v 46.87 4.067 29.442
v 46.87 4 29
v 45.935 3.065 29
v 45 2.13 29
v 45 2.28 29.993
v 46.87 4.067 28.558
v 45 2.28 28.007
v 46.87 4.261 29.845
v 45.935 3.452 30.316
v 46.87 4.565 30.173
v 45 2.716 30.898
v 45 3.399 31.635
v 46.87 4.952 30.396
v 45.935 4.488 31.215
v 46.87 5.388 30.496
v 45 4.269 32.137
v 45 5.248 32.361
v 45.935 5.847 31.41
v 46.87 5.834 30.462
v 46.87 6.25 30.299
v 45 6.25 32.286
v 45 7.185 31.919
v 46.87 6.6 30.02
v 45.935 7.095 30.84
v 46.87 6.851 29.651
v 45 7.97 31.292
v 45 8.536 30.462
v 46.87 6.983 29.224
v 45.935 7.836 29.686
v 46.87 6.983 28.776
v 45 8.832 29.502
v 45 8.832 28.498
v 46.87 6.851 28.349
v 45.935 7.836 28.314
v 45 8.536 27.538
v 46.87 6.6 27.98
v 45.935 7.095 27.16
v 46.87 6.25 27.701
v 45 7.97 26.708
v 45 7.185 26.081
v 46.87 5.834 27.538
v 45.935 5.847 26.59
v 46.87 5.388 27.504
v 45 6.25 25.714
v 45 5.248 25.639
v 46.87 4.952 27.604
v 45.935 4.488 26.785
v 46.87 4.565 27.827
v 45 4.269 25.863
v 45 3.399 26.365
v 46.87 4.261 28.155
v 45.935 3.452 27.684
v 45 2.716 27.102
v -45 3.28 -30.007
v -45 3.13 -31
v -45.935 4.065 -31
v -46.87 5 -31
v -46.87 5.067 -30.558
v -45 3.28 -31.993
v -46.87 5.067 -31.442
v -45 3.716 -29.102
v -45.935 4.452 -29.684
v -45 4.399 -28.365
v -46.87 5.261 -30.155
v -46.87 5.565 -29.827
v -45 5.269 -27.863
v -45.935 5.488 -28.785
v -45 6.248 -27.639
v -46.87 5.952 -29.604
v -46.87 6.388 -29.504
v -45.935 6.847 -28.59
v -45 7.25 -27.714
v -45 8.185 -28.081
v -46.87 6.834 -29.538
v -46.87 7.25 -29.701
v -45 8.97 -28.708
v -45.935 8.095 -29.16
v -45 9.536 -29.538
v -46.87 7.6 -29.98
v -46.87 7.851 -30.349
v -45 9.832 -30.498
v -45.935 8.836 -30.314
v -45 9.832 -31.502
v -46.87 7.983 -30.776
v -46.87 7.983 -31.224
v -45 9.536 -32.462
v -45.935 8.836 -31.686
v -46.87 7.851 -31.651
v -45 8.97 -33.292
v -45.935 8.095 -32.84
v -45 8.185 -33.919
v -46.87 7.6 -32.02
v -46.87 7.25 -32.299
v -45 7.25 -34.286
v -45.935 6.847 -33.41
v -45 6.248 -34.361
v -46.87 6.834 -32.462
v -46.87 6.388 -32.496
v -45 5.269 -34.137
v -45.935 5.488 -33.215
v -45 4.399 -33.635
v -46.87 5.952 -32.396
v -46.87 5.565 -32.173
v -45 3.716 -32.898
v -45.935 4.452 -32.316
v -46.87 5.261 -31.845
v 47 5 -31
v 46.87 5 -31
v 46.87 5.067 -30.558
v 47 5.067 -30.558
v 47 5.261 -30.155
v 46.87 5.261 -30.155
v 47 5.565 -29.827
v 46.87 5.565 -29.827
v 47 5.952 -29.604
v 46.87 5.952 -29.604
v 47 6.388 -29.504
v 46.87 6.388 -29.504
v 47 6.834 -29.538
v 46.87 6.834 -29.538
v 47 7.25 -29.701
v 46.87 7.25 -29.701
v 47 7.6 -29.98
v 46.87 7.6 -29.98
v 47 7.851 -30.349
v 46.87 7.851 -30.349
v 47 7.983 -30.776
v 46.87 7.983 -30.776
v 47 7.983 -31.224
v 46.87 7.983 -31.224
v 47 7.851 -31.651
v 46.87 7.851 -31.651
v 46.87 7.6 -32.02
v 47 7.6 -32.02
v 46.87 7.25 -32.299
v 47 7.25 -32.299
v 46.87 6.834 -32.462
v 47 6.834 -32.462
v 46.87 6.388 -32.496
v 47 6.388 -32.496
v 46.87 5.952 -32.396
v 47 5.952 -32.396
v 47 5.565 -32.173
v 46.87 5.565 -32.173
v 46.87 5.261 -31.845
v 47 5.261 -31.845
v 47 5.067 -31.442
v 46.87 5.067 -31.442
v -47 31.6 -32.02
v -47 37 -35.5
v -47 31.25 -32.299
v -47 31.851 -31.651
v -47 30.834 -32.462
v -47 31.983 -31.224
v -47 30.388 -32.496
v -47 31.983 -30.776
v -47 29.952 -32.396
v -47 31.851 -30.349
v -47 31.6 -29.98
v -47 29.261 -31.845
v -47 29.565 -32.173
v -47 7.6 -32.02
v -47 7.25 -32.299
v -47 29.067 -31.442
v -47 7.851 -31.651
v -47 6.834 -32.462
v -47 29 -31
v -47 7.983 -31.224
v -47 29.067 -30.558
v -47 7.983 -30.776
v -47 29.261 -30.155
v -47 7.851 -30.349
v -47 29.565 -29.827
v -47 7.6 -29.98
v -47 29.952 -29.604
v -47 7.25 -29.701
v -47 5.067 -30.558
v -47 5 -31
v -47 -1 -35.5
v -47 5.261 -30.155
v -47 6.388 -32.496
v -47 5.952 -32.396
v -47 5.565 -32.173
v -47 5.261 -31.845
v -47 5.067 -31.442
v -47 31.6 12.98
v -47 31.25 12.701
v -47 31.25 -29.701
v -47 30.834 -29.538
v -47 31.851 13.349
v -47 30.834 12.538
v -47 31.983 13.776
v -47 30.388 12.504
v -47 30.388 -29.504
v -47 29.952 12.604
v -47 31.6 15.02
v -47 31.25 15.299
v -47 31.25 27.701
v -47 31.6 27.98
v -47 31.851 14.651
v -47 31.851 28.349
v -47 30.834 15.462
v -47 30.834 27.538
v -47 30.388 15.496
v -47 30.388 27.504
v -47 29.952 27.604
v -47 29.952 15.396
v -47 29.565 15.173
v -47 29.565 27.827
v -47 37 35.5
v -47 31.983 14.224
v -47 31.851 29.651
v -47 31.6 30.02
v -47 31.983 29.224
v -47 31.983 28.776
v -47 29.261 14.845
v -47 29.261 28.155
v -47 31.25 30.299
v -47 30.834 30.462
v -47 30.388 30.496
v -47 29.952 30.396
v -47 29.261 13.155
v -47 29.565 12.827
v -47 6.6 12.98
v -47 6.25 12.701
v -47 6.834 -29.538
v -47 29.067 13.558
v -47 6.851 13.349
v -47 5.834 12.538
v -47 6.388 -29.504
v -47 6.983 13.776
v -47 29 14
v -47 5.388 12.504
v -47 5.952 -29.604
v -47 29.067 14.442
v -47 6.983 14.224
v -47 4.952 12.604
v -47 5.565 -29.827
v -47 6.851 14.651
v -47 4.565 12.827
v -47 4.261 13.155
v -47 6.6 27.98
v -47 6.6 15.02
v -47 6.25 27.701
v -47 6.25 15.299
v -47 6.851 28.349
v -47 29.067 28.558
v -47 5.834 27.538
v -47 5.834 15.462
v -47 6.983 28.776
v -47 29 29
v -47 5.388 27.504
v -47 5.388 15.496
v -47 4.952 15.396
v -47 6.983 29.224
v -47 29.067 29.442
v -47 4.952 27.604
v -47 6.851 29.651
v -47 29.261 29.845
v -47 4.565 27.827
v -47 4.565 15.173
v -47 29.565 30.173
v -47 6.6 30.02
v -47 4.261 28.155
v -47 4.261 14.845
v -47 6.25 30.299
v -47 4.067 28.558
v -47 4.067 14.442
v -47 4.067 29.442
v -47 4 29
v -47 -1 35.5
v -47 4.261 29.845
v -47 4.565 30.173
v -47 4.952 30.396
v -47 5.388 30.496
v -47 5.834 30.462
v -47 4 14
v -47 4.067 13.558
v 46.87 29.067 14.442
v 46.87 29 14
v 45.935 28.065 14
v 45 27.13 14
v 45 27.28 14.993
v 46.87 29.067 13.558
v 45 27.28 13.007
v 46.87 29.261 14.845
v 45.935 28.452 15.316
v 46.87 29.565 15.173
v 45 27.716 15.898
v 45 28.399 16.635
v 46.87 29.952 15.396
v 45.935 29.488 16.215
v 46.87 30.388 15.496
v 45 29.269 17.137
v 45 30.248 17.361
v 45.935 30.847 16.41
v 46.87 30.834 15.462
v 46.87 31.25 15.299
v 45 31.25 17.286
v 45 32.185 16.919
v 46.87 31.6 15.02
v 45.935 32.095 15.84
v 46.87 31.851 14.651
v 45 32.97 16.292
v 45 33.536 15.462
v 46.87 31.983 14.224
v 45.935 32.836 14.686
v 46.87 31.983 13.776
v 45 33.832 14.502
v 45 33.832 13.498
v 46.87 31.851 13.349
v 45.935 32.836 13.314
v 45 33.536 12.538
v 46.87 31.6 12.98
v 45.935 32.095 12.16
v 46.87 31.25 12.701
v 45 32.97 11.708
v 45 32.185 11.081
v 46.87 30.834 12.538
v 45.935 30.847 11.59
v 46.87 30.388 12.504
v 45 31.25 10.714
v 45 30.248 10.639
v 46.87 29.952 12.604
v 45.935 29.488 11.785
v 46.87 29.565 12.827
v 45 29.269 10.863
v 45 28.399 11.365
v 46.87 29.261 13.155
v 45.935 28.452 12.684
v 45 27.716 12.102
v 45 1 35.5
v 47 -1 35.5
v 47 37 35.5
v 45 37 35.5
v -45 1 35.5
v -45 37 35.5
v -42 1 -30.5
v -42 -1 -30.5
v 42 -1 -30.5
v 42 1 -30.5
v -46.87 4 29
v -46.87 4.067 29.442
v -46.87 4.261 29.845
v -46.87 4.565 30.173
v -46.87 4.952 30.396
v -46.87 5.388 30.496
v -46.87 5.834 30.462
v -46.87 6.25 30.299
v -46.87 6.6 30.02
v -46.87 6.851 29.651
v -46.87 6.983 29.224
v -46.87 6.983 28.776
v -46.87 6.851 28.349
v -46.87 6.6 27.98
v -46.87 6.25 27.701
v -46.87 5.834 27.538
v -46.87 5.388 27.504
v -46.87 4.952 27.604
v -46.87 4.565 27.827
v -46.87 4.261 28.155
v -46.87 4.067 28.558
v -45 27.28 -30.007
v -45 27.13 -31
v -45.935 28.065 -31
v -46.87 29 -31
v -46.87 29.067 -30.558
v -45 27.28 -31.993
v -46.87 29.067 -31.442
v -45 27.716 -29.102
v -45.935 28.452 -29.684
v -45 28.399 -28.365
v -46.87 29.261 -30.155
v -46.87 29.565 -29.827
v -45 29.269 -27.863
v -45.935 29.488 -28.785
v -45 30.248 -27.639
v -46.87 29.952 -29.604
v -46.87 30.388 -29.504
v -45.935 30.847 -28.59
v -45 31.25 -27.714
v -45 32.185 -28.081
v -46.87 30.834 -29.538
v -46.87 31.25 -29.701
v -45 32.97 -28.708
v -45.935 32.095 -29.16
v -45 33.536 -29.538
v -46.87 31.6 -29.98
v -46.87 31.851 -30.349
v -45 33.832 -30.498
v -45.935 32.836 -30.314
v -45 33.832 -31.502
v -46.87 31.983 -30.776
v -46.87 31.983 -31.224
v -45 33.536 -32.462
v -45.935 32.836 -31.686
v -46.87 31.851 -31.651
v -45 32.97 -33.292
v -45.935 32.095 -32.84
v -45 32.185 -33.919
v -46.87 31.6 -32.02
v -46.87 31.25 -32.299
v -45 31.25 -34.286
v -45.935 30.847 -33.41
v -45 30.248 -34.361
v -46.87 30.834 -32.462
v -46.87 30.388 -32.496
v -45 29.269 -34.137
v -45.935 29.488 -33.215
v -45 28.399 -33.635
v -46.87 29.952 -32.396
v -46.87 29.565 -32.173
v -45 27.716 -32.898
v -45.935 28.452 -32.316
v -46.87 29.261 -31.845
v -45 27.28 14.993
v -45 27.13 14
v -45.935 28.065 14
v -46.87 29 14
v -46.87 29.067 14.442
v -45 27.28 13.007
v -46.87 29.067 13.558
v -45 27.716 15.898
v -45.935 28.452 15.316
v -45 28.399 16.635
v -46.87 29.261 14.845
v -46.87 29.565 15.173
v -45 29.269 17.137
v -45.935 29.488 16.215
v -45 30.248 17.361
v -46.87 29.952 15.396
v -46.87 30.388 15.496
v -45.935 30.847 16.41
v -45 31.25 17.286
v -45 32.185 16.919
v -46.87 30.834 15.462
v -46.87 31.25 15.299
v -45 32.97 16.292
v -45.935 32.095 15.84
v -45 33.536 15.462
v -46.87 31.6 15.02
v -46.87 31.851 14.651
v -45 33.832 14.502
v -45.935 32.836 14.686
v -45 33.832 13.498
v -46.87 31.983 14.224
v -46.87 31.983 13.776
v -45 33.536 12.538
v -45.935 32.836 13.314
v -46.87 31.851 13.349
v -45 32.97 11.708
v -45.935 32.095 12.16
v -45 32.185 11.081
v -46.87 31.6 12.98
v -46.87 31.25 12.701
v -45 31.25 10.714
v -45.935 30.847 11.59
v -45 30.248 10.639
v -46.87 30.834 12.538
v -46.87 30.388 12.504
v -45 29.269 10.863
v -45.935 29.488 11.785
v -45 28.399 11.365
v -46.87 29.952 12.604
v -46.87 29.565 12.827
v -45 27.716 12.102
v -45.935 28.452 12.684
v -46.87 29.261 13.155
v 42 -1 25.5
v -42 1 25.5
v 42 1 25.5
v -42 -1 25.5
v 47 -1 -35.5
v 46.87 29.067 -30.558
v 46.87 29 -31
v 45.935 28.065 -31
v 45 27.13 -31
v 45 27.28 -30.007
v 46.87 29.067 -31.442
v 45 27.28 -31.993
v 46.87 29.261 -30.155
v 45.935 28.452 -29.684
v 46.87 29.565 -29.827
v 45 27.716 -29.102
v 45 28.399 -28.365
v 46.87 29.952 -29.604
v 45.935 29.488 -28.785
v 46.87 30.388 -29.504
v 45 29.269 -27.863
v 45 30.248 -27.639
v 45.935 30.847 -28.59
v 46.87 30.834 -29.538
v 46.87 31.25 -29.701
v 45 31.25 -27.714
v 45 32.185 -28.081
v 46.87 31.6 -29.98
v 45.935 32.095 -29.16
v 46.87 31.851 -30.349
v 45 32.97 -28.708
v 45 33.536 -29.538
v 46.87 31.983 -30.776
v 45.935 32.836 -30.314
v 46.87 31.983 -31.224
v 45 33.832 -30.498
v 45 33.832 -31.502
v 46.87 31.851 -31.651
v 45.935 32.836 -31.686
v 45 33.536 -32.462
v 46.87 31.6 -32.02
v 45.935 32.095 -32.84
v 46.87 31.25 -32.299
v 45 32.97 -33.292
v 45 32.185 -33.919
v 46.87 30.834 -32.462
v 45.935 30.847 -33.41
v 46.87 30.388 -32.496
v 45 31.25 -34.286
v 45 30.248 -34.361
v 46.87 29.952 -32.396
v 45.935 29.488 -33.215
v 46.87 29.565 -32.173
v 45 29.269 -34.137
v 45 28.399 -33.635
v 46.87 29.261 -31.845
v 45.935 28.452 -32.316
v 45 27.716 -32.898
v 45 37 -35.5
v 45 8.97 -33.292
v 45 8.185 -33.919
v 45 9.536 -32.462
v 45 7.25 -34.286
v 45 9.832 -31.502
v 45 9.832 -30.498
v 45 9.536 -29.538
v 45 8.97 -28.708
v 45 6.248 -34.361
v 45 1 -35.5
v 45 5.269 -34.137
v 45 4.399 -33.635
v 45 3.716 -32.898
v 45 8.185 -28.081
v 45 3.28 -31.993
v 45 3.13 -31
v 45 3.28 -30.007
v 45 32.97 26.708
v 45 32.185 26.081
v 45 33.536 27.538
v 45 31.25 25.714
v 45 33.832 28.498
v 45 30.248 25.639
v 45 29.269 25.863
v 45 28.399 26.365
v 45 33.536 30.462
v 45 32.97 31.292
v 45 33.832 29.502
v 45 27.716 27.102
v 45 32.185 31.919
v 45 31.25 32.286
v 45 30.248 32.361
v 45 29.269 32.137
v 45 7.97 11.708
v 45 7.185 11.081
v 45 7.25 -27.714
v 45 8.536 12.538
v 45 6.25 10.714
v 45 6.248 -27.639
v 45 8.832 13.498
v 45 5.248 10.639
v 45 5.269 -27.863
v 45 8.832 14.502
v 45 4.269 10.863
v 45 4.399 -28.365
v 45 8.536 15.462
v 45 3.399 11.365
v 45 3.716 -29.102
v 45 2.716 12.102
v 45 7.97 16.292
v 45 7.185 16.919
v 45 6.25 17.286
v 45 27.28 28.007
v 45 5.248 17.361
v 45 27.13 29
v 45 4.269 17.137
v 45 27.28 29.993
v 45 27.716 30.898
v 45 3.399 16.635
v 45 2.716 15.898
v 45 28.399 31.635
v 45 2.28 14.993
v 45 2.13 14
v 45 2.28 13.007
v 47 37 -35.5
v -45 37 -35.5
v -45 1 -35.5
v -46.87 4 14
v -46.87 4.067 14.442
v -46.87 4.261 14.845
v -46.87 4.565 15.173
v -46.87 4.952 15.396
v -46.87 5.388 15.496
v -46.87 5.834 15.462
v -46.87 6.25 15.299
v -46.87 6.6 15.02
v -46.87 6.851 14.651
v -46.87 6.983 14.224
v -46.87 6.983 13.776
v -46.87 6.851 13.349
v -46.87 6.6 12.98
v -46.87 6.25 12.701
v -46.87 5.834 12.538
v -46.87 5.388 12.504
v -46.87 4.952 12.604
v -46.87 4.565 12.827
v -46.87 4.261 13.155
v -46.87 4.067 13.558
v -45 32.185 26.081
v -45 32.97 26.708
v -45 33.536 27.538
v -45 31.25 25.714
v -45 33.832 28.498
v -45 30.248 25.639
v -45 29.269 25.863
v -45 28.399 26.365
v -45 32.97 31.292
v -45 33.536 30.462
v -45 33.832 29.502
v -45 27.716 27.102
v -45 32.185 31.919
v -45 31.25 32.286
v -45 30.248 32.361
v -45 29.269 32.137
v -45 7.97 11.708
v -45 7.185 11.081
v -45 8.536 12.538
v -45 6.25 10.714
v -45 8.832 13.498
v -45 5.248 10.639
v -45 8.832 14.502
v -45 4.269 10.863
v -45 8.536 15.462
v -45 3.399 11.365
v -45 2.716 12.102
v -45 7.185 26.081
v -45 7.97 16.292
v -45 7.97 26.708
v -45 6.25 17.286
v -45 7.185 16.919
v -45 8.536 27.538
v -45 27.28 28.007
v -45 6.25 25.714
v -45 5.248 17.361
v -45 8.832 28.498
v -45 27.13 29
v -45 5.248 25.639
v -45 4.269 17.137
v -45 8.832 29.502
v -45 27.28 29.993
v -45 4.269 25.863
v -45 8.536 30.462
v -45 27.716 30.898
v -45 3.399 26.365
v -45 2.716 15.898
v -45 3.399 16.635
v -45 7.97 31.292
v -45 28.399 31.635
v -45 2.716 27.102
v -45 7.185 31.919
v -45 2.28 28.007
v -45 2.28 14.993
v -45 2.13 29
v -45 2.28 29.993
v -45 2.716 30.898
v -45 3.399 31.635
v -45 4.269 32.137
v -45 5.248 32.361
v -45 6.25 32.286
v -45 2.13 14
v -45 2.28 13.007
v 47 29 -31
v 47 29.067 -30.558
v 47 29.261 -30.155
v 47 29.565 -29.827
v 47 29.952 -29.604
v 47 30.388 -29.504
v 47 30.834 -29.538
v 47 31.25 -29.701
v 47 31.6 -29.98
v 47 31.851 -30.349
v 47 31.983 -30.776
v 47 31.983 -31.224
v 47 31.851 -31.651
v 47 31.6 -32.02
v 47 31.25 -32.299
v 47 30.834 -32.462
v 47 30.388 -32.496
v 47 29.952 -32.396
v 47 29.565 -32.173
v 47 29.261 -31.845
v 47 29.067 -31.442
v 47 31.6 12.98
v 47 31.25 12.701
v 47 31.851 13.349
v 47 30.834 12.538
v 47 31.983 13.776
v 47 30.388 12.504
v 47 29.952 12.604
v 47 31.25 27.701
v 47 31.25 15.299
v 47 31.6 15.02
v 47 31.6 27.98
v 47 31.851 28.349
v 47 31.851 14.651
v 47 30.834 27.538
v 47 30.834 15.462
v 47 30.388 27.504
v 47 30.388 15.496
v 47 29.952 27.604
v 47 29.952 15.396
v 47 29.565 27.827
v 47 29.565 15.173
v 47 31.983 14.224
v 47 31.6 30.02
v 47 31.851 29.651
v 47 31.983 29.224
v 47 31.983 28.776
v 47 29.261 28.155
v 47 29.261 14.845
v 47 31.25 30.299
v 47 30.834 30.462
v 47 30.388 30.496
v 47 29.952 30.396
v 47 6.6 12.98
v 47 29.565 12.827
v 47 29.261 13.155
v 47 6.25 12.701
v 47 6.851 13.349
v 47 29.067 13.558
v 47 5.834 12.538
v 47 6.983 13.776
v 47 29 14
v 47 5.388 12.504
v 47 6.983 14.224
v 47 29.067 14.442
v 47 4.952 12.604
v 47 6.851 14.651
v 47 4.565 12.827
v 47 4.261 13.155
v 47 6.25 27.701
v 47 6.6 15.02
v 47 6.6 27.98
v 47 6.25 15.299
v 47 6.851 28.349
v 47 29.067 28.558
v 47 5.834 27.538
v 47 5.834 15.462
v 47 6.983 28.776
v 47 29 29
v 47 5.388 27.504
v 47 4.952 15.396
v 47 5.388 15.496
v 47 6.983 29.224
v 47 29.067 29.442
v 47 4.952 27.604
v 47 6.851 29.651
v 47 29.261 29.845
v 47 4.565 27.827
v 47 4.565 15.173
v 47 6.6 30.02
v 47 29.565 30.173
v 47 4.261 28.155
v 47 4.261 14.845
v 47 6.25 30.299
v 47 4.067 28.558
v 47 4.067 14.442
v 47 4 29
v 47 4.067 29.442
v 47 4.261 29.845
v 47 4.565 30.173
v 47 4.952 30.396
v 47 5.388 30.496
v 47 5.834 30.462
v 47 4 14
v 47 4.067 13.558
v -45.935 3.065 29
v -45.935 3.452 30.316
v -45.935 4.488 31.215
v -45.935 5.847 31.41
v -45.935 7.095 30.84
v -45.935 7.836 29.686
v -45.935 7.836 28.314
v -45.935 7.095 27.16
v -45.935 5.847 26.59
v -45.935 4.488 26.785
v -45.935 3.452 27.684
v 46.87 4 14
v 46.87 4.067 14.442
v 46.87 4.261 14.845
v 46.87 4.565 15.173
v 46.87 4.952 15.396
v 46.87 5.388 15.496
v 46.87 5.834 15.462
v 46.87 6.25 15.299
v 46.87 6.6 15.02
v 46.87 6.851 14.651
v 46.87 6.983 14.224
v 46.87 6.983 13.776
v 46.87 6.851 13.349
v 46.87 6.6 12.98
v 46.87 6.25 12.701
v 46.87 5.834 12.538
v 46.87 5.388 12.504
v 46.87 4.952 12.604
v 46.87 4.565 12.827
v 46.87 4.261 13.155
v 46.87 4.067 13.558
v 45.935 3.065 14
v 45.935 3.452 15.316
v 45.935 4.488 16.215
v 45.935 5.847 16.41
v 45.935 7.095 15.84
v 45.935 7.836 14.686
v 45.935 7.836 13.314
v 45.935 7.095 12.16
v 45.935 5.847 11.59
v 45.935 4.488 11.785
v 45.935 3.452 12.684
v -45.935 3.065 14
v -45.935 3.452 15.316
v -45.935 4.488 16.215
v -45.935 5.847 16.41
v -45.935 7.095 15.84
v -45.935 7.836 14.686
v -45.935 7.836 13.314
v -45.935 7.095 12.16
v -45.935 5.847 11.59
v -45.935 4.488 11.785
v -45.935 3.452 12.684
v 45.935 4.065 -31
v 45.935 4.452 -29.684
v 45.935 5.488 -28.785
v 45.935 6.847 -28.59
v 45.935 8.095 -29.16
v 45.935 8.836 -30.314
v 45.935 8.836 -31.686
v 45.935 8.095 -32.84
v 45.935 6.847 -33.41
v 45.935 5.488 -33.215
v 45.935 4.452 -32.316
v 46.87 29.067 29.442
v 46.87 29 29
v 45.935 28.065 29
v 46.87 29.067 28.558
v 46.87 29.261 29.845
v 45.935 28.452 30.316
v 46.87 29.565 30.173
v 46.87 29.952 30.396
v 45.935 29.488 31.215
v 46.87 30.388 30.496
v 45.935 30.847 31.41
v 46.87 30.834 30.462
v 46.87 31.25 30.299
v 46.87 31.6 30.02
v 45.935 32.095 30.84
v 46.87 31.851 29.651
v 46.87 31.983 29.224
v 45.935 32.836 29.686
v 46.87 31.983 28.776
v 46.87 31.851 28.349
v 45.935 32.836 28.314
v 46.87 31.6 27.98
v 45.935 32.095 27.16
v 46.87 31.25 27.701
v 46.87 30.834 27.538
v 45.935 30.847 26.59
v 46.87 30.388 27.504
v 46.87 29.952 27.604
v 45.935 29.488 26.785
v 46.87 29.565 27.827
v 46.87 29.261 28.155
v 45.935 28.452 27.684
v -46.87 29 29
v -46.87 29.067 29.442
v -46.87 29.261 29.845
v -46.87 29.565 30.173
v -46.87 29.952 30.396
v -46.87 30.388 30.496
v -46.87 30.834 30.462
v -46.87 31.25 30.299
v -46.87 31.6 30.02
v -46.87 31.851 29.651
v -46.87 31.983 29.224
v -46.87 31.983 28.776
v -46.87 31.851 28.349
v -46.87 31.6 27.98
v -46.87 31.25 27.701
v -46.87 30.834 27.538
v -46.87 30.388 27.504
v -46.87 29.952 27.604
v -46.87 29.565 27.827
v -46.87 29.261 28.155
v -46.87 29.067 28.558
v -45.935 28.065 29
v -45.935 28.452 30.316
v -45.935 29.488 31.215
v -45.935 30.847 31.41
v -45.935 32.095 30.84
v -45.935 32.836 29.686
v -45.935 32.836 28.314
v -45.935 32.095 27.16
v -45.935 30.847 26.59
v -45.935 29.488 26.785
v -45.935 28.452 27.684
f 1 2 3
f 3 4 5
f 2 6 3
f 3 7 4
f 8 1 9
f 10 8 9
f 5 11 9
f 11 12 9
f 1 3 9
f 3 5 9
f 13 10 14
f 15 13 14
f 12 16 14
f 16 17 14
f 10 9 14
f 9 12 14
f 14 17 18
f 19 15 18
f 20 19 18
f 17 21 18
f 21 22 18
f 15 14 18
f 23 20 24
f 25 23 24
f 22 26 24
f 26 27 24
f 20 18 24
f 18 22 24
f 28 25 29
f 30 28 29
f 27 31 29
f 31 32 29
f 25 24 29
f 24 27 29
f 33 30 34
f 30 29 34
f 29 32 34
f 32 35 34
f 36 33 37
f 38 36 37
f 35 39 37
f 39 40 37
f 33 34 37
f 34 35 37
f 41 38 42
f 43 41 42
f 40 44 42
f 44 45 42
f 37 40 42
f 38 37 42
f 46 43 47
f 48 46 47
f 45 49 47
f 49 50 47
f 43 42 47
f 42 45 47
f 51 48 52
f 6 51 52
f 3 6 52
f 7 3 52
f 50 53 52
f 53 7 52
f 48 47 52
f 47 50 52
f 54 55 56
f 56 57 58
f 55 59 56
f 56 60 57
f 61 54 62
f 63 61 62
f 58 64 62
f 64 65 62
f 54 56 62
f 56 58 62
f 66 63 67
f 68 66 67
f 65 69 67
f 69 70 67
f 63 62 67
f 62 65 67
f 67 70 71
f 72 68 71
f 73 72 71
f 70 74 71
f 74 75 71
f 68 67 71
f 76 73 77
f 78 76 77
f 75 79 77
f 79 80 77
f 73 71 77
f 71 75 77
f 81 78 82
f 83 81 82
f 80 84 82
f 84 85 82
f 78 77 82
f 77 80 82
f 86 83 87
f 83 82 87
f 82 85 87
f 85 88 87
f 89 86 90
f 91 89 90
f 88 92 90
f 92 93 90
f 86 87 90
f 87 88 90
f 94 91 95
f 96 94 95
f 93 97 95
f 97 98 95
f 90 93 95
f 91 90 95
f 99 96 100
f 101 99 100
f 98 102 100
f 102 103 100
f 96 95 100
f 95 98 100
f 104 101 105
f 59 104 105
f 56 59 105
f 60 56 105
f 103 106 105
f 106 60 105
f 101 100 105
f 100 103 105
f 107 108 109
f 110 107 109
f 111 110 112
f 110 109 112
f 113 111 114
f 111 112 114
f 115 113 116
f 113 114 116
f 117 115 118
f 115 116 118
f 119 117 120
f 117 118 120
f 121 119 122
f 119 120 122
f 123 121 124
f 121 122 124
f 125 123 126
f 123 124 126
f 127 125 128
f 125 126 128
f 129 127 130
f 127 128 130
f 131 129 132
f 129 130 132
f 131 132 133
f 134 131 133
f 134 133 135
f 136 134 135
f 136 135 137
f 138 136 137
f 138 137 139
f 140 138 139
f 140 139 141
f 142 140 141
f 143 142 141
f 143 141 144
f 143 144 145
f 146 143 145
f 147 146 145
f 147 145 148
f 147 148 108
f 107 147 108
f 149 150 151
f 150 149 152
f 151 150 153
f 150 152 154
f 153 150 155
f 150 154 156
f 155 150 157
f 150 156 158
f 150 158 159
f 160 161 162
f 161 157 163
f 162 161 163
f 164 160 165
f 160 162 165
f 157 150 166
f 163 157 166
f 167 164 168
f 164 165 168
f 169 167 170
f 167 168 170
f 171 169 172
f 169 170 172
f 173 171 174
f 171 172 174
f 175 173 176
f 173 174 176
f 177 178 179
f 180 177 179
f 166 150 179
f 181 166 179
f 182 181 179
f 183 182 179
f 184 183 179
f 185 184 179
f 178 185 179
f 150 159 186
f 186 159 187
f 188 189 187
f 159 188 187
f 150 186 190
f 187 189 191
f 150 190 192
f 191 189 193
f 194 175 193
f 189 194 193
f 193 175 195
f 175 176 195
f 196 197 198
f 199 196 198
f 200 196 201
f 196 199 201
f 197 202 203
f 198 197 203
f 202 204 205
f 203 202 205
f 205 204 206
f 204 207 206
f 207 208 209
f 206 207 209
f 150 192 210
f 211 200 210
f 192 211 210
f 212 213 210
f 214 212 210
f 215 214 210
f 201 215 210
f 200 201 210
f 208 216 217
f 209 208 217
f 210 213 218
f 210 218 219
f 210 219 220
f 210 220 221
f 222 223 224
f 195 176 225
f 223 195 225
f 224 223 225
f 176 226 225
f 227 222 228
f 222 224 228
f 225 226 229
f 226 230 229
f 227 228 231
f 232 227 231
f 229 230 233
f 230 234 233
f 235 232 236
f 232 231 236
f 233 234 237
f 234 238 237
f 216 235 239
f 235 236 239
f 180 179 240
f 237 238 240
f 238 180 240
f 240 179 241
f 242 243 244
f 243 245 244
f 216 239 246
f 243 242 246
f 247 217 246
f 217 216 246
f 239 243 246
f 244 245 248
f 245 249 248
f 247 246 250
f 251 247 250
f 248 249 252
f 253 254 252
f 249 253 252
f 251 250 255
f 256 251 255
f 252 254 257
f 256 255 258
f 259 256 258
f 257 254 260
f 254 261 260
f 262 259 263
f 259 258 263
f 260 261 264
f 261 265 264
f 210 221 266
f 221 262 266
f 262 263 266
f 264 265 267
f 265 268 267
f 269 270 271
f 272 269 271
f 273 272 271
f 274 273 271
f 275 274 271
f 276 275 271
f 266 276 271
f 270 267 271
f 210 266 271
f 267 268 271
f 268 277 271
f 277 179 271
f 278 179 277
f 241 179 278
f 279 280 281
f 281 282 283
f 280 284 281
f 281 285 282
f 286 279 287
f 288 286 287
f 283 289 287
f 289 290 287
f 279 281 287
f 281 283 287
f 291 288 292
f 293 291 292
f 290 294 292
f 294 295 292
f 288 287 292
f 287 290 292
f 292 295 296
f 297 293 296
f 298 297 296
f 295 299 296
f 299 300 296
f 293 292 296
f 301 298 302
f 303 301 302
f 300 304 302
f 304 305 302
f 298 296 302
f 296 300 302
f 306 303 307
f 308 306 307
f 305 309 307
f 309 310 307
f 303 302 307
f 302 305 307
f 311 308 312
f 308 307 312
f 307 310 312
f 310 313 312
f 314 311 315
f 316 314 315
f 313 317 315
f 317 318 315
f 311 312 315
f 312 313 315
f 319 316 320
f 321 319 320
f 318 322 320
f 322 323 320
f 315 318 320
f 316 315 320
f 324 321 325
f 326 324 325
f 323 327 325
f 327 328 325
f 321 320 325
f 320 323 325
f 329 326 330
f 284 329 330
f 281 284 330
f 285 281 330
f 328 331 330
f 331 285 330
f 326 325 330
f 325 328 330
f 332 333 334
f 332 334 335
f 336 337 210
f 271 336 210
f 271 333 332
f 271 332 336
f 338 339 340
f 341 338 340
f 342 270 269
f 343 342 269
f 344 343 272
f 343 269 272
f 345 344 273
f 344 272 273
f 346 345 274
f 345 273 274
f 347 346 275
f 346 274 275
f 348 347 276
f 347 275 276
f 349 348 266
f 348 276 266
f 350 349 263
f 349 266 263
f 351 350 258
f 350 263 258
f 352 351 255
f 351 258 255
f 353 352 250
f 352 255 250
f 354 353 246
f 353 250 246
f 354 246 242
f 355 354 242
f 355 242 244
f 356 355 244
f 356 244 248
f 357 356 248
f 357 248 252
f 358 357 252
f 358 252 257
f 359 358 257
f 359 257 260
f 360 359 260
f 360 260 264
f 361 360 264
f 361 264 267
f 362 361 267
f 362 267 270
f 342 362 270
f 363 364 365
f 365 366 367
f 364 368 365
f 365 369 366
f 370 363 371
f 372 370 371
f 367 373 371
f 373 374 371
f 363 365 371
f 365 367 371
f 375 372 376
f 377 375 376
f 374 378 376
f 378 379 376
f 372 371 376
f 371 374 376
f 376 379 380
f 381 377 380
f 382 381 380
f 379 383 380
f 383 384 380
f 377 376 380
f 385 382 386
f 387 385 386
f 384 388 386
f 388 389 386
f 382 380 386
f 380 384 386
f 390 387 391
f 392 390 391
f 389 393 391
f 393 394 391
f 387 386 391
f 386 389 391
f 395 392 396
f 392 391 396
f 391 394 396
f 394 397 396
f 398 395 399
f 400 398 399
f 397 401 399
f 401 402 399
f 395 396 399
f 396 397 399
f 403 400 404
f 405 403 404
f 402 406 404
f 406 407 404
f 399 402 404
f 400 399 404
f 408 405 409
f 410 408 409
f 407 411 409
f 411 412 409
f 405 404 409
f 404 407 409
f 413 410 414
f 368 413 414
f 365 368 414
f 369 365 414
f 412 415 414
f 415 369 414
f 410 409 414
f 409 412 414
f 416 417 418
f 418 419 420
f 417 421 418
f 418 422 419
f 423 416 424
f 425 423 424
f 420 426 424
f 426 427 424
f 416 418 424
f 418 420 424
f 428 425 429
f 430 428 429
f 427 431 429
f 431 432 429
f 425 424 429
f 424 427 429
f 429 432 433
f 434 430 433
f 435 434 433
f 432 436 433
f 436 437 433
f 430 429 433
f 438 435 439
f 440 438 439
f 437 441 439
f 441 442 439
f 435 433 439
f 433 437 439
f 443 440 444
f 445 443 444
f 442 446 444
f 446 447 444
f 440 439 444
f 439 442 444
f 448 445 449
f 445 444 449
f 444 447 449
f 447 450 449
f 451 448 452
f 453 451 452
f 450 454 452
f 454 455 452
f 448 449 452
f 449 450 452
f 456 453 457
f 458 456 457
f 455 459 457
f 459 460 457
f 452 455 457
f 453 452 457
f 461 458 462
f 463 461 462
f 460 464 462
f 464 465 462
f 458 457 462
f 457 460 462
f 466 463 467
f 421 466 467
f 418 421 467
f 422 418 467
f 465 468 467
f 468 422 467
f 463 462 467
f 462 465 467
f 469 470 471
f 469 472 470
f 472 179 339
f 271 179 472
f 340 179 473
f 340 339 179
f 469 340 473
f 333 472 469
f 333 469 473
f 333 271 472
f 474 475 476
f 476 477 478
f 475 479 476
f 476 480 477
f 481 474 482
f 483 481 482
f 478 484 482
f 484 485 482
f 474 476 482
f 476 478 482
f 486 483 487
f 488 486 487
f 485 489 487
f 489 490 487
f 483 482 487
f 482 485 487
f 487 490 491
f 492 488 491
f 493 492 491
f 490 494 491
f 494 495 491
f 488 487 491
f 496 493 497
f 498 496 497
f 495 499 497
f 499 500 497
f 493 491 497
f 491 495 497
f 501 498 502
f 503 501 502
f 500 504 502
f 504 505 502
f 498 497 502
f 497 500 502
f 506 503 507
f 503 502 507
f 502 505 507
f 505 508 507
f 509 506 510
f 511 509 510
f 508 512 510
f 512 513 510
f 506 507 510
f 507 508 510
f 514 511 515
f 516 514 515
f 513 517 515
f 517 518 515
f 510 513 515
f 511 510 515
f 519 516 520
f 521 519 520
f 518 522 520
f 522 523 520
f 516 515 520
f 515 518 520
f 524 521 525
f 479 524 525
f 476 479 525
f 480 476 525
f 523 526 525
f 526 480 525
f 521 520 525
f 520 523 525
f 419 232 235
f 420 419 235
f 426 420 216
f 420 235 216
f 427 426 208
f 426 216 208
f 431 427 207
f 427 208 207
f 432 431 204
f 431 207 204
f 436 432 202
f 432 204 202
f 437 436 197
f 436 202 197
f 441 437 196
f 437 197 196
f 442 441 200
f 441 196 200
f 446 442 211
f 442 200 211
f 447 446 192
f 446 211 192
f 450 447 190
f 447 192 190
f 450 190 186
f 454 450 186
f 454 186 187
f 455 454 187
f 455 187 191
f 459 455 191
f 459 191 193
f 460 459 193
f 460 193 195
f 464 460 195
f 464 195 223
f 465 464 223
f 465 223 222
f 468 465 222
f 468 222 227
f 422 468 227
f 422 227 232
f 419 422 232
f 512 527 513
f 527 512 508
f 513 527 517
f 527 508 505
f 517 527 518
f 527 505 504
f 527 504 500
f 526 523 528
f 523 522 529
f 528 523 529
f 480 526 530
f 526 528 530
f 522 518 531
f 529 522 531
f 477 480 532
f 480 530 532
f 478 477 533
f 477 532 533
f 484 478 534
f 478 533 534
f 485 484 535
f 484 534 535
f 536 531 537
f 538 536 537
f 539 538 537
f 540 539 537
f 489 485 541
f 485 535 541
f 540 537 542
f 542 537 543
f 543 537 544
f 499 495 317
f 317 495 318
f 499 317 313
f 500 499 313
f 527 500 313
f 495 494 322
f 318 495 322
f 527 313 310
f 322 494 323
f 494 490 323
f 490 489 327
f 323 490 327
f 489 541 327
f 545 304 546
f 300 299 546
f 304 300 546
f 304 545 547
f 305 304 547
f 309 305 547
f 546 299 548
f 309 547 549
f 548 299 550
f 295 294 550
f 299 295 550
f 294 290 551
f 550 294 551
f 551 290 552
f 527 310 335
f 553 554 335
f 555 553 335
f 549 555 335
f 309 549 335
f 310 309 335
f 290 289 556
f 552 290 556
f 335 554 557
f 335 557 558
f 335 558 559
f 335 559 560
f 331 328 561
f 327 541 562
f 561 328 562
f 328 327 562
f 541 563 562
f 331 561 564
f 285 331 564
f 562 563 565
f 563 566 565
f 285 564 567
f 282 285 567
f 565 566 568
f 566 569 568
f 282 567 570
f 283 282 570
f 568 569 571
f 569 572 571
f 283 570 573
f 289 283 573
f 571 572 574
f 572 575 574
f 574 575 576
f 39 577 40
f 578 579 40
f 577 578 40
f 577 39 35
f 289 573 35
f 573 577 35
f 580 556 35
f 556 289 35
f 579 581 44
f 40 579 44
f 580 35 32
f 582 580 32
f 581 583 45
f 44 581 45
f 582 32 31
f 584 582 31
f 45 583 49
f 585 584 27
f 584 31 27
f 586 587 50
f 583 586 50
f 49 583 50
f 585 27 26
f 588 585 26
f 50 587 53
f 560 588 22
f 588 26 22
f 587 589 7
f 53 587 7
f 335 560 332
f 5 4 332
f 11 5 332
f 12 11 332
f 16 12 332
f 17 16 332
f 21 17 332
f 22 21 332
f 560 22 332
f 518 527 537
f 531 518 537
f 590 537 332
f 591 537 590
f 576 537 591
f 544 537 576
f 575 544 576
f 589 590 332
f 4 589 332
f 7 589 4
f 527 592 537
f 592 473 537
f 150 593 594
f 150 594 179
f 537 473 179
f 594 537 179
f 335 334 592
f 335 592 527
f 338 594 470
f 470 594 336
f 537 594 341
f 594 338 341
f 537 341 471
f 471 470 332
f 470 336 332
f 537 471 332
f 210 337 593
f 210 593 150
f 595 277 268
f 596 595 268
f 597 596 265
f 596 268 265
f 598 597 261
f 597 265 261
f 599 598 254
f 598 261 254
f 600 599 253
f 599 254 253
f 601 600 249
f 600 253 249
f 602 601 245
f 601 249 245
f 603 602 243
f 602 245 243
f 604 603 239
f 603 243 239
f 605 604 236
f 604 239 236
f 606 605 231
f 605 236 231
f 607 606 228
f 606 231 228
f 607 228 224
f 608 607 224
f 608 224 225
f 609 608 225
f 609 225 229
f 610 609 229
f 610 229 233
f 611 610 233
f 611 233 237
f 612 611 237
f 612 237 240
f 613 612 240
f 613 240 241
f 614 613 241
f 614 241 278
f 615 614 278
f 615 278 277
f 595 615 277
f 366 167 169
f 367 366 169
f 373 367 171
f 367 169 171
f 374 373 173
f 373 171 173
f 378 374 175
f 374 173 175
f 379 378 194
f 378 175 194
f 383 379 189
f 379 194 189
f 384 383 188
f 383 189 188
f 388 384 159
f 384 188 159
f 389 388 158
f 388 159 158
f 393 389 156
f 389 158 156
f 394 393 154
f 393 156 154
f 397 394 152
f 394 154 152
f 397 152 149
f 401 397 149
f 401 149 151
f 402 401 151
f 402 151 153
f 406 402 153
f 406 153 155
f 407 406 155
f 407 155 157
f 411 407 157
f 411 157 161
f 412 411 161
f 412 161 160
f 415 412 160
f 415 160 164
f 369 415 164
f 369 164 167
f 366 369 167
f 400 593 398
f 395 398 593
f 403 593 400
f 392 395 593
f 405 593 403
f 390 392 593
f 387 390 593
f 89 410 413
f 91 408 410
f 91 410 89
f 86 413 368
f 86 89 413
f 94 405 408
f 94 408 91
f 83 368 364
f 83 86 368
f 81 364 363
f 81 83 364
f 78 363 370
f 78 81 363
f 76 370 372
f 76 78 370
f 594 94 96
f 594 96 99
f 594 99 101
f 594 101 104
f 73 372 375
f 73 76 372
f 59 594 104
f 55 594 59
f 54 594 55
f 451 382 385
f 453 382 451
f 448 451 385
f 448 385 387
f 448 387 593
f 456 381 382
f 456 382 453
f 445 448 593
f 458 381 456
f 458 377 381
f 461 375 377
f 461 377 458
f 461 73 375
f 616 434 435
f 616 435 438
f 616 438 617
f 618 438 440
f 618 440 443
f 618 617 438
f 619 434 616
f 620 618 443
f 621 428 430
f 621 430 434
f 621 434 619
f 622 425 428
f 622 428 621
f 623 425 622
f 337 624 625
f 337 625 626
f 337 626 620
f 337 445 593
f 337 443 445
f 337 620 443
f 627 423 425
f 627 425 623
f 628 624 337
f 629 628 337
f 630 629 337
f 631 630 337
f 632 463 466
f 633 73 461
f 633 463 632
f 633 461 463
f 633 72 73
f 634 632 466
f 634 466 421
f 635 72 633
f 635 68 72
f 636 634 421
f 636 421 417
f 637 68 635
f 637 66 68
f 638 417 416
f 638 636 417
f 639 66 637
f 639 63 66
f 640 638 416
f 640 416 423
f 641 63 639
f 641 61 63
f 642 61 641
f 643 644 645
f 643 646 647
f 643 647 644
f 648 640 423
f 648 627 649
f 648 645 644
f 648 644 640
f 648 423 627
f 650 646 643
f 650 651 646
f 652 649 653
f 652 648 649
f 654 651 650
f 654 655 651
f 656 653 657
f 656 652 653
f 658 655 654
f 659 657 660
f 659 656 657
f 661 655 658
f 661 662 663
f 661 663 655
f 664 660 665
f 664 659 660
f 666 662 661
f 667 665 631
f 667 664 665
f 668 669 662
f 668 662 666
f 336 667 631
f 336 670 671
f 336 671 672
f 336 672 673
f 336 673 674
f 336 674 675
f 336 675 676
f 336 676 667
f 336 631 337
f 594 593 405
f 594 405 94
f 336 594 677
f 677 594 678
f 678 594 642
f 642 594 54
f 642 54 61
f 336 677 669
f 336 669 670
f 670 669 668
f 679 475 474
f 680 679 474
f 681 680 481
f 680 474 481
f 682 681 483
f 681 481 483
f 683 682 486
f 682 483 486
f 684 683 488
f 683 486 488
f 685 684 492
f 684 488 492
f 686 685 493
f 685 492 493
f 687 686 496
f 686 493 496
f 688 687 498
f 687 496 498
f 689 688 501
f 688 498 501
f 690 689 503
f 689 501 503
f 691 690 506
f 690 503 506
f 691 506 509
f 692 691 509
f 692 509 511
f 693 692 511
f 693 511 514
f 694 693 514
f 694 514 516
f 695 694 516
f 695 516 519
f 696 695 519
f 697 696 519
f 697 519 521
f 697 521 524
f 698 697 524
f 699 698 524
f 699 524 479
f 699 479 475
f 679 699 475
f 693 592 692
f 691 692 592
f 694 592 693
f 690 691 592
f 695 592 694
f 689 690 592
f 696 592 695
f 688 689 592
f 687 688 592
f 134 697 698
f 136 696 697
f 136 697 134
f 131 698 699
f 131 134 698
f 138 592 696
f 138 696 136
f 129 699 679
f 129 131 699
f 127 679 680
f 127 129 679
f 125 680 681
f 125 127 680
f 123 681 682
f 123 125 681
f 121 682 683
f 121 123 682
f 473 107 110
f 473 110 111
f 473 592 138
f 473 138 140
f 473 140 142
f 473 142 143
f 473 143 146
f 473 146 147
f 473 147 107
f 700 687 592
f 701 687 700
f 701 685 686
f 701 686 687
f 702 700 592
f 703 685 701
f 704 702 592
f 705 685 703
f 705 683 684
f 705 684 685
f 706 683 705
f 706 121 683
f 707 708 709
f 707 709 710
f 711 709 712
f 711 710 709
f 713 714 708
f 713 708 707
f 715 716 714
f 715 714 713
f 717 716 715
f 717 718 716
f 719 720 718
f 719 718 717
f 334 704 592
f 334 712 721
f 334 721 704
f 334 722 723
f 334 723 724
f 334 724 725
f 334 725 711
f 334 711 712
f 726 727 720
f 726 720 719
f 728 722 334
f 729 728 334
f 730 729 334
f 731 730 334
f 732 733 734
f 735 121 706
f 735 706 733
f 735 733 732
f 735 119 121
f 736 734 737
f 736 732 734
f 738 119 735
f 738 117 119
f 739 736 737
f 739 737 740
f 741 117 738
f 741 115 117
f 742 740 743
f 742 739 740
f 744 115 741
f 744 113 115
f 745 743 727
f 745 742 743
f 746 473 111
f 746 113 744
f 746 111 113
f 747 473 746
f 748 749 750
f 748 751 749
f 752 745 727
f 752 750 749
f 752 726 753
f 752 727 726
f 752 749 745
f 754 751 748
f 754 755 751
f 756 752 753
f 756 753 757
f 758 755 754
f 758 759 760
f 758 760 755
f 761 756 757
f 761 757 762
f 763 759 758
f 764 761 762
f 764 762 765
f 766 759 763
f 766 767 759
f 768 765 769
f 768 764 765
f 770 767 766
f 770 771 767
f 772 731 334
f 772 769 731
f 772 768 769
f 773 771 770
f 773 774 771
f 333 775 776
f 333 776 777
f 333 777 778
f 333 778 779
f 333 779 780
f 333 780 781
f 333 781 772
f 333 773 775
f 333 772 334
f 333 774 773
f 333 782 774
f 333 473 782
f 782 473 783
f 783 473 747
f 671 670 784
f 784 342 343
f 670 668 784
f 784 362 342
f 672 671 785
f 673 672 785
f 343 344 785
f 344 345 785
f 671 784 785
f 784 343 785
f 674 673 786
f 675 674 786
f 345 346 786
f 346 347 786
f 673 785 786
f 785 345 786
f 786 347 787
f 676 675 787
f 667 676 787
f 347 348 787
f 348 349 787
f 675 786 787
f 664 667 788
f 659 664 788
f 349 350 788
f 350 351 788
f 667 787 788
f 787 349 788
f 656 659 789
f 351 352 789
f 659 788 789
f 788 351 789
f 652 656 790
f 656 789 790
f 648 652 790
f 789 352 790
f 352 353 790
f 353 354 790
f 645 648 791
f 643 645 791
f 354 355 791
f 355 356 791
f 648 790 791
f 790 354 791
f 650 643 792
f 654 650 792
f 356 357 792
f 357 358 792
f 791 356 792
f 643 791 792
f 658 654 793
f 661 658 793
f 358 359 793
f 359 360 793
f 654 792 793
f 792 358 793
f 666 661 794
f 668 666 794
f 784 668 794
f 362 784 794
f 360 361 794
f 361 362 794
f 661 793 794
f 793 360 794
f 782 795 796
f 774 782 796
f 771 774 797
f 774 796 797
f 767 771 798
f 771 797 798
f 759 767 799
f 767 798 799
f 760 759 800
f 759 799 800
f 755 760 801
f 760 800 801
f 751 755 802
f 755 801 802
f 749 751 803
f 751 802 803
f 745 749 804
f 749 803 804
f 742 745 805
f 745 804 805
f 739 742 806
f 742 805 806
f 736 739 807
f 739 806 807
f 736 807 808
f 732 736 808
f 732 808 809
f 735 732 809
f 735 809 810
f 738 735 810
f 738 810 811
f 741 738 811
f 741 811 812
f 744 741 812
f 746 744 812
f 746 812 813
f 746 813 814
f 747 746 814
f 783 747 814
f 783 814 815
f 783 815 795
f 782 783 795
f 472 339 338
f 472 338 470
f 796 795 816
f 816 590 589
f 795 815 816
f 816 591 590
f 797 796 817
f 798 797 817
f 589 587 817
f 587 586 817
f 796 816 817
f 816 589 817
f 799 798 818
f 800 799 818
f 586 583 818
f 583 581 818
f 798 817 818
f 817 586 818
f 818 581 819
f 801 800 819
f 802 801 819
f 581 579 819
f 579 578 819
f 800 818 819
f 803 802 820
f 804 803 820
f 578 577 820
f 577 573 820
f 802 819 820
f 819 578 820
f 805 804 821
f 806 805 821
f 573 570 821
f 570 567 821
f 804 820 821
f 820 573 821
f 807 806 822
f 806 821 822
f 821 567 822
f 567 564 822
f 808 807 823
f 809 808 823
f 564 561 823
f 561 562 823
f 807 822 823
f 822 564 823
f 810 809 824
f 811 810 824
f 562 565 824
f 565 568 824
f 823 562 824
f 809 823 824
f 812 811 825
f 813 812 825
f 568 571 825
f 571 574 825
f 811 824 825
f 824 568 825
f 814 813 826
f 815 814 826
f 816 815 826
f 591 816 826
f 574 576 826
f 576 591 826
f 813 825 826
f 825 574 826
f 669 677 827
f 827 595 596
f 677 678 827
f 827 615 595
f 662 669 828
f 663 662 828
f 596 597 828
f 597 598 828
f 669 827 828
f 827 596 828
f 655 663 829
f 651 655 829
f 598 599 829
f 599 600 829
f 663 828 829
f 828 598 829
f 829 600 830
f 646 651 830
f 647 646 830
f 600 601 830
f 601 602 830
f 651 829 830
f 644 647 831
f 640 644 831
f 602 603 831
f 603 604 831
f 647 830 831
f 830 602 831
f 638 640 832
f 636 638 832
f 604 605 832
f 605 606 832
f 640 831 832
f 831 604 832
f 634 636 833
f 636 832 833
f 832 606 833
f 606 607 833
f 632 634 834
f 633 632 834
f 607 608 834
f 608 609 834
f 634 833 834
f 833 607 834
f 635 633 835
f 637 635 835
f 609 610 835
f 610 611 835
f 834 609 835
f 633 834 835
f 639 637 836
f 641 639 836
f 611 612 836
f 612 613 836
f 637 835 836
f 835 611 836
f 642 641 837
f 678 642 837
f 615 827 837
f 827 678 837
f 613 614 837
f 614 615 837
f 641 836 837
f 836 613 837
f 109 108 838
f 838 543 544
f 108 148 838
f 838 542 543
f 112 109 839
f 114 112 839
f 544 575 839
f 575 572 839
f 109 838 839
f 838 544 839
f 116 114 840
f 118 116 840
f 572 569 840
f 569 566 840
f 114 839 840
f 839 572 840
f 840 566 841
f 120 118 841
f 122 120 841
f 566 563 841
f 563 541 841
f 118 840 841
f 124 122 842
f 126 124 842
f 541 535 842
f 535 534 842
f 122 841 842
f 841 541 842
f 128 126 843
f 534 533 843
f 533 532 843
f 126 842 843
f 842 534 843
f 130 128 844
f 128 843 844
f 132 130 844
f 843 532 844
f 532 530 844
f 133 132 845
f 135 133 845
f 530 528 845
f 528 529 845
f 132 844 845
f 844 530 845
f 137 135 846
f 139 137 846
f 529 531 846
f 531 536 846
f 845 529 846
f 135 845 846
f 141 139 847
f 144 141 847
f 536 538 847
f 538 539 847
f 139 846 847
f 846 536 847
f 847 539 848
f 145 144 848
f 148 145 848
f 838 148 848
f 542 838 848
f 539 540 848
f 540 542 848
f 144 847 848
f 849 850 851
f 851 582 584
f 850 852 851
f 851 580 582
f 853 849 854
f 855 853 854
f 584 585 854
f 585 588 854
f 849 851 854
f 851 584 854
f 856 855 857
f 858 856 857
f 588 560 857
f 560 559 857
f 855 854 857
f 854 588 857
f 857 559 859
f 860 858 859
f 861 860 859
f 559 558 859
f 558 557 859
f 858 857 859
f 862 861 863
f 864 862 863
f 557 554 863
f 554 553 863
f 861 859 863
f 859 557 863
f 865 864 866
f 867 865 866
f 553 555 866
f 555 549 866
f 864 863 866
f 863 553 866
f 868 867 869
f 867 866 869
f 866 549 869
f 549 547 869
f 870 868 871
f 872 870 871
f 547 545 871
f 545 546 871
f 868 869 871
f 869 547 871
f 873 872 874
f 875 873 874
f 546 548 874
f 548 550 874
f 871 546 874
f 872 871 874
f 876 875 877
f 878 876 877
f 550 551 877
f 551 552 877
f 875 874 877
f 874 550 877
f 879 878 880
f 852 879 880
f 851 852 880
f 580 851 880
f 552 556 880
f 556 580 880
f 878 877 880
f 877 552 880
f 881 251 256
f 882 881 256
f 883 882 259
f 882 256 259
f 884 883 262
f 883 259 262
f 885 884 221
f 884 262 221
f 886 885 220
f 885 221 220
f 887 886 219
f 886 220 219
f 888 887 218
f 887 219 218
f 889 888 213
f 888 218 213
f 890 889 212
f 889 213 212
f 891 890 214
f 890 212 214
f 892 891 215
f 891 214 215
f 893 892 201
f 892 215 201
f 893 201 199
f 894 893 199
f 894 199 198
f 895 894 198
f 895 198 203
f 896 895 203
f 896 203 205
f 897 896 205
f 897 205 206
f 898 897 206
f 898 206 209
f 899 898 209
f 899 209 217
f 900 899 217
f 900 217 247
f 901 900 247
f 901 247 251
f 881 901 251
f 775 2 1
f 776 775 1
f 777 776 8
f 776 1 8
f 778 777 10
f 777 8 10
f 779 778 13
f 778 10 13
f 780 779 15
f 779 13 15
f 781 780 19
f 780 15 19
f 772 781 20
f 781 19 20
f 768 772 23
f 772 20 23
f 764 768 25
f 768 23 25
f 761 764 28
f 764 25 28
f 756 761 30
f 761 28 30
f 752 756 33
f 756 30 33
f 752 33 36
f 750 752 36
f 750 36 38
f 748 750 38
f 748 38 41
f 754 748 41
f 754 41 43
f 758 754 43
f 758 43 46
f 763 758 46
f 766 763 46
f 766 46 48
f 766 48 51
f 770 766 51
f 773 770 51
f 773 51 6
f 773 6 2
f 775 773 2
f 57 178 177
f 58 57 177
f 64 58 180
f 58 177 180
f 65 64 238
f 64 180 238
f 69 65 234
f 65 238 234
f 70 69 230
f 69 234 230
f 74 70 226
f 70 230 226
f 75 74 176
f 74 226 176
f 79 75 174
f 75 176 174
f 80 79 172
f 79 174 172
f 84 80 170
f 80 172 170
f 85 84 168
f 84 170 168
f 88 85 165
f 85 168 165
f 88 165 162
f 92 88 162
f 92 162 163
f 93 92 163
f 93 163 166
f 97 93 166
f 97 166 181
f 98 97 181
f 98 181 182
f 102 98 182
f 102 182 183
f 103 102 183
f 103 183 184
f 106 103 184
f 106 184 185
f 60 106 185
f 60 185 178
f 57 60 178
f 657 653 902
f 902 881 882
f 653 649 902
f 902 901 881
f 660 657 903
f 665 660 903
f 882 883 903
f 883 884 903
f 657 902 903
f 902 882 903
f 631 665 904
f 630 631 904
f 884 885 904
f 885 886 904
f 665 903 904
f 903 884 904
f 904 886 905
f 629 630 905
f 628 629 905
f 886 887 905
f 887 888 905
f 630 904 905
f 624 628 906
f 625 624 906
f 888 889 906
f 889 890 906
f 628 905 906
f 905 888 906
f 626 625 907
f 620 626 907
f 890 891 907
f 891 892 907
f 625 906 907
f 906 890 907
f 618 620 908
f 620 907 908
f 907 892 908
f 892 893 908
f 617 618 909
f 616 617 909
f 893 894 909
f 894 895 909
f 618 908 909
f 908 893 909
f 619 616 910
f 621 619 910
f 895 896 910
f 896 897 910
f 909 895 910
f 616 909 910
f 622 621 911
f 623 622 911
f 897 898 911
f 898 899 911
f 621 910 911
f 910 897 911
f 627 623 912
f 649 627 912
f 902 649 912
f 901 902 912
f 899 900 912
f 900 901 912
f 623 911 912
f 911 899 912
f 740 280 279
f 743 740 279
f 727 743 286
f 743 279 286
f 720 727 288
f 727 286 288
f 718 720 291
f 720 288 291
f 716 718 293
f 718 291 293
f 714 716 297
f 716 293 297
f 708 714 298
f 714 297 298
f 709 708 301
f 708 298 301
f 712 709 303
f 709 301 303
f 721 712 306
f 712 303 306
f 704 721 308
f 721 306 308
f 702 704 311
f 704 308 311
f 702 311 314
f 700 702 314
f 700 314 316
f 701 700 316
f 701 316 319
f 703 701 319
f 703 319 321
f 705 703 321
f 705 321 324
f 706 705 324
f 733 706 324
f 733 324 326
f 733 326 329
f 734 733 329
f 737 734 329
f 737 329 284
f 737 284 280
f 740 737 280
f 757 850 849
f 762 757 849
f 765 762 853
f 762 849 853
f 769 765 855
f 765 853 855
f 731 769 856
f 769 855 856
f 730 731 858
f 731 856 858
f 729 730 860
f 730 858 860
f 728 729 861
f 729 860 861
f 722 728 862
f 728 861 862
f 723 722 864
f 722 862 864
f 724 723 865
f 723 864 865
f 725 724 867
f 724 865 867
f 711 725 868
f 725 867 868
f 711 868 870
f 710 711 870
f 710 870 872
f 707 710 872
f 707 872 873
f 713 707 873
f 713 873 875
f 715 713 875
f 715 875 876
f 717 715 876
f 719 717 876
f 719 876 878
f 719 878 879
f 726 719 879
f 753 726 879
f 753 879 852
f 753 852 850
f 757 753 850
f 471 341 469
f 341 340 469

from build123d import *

# Parameters (mm, degrees)
F0_W     = 94
F0_H     = 71
F0_W_2   = 84
F0_H_2   = 56
F1_DEPTH = 1
F2_W     = 2
F2_H     = 71
F3_DEPTH = 36
F4_R     = 1.5
F5_DEPTH = 100
F6_SIZE  = 1.87


with BuildPart() as f1:
    # F0 (on Front) → F1 (new body, symmetric)
    with BuildSketch(Plane.XZ):
        Rectangle(F0_W, F0_H)
        with Locations((0, -2.5)):
            Rectangle(F0_W_2, F0_H_2, mode=Mode.SUBTRACT)
    extrude(amount=F1_DEPTH, both=True)

    # F2 (on face) → F3 (join)
    with BuildSketch(Plane(origin=(0, 1, 0), x_dir=(-1, 0, 0), z_dir=(0, 1, 0))):
        with Locations((-46, 0)):
            Rectangle(F2_W, F2_H)
        with Locations((46, 0)):
            Rectangle(F2_W, F2_H)
    extrude(amount=F3_DEPTH)

    # F4 (on face) → F5 (cut)
    with BuildSketch(Plane(origin=(-47, 0, 0), x_dir=(0, -1, 0), z_dir=(-1, 0, 0))):
        with Locations((-30.5, -31)):
            Circle(F4_R)
        with Locations((-6.5, -31)):
            Circle(F4_R)
        with Locations((-30.5, 29)):
            Circle(F4_R)
        with Locations((-5.5, 29)):
            Circle(F4_R)
        with Locations((-30.5, 14)):
            Circle(F4_R)
        with Locations((-5.5, 14)):
            Circle(F4_R)
    extrude(amount=-F5_DEPTH, mode=Mode.SUBTRACT)

    # F6
    f6_edges = [f1.edges().sort_by_distance(p)[0] for p in [
        (-45, 32, 29),
        (-45, 32, 14),
        (-45, 7, 29),
        (45, 7, 29),
        (45, 7, 14),
        (45, 32, 29),
        (45, 32, 14),
        (-45, 7, 14),
        (45, 8, -31),
        (45, 32, -31),
        (-45, 8, -31),
        (-45, 32, -31),
    ]]
    chamfer(f6_edges, length=F6_SIZE)


solid = f1.part
